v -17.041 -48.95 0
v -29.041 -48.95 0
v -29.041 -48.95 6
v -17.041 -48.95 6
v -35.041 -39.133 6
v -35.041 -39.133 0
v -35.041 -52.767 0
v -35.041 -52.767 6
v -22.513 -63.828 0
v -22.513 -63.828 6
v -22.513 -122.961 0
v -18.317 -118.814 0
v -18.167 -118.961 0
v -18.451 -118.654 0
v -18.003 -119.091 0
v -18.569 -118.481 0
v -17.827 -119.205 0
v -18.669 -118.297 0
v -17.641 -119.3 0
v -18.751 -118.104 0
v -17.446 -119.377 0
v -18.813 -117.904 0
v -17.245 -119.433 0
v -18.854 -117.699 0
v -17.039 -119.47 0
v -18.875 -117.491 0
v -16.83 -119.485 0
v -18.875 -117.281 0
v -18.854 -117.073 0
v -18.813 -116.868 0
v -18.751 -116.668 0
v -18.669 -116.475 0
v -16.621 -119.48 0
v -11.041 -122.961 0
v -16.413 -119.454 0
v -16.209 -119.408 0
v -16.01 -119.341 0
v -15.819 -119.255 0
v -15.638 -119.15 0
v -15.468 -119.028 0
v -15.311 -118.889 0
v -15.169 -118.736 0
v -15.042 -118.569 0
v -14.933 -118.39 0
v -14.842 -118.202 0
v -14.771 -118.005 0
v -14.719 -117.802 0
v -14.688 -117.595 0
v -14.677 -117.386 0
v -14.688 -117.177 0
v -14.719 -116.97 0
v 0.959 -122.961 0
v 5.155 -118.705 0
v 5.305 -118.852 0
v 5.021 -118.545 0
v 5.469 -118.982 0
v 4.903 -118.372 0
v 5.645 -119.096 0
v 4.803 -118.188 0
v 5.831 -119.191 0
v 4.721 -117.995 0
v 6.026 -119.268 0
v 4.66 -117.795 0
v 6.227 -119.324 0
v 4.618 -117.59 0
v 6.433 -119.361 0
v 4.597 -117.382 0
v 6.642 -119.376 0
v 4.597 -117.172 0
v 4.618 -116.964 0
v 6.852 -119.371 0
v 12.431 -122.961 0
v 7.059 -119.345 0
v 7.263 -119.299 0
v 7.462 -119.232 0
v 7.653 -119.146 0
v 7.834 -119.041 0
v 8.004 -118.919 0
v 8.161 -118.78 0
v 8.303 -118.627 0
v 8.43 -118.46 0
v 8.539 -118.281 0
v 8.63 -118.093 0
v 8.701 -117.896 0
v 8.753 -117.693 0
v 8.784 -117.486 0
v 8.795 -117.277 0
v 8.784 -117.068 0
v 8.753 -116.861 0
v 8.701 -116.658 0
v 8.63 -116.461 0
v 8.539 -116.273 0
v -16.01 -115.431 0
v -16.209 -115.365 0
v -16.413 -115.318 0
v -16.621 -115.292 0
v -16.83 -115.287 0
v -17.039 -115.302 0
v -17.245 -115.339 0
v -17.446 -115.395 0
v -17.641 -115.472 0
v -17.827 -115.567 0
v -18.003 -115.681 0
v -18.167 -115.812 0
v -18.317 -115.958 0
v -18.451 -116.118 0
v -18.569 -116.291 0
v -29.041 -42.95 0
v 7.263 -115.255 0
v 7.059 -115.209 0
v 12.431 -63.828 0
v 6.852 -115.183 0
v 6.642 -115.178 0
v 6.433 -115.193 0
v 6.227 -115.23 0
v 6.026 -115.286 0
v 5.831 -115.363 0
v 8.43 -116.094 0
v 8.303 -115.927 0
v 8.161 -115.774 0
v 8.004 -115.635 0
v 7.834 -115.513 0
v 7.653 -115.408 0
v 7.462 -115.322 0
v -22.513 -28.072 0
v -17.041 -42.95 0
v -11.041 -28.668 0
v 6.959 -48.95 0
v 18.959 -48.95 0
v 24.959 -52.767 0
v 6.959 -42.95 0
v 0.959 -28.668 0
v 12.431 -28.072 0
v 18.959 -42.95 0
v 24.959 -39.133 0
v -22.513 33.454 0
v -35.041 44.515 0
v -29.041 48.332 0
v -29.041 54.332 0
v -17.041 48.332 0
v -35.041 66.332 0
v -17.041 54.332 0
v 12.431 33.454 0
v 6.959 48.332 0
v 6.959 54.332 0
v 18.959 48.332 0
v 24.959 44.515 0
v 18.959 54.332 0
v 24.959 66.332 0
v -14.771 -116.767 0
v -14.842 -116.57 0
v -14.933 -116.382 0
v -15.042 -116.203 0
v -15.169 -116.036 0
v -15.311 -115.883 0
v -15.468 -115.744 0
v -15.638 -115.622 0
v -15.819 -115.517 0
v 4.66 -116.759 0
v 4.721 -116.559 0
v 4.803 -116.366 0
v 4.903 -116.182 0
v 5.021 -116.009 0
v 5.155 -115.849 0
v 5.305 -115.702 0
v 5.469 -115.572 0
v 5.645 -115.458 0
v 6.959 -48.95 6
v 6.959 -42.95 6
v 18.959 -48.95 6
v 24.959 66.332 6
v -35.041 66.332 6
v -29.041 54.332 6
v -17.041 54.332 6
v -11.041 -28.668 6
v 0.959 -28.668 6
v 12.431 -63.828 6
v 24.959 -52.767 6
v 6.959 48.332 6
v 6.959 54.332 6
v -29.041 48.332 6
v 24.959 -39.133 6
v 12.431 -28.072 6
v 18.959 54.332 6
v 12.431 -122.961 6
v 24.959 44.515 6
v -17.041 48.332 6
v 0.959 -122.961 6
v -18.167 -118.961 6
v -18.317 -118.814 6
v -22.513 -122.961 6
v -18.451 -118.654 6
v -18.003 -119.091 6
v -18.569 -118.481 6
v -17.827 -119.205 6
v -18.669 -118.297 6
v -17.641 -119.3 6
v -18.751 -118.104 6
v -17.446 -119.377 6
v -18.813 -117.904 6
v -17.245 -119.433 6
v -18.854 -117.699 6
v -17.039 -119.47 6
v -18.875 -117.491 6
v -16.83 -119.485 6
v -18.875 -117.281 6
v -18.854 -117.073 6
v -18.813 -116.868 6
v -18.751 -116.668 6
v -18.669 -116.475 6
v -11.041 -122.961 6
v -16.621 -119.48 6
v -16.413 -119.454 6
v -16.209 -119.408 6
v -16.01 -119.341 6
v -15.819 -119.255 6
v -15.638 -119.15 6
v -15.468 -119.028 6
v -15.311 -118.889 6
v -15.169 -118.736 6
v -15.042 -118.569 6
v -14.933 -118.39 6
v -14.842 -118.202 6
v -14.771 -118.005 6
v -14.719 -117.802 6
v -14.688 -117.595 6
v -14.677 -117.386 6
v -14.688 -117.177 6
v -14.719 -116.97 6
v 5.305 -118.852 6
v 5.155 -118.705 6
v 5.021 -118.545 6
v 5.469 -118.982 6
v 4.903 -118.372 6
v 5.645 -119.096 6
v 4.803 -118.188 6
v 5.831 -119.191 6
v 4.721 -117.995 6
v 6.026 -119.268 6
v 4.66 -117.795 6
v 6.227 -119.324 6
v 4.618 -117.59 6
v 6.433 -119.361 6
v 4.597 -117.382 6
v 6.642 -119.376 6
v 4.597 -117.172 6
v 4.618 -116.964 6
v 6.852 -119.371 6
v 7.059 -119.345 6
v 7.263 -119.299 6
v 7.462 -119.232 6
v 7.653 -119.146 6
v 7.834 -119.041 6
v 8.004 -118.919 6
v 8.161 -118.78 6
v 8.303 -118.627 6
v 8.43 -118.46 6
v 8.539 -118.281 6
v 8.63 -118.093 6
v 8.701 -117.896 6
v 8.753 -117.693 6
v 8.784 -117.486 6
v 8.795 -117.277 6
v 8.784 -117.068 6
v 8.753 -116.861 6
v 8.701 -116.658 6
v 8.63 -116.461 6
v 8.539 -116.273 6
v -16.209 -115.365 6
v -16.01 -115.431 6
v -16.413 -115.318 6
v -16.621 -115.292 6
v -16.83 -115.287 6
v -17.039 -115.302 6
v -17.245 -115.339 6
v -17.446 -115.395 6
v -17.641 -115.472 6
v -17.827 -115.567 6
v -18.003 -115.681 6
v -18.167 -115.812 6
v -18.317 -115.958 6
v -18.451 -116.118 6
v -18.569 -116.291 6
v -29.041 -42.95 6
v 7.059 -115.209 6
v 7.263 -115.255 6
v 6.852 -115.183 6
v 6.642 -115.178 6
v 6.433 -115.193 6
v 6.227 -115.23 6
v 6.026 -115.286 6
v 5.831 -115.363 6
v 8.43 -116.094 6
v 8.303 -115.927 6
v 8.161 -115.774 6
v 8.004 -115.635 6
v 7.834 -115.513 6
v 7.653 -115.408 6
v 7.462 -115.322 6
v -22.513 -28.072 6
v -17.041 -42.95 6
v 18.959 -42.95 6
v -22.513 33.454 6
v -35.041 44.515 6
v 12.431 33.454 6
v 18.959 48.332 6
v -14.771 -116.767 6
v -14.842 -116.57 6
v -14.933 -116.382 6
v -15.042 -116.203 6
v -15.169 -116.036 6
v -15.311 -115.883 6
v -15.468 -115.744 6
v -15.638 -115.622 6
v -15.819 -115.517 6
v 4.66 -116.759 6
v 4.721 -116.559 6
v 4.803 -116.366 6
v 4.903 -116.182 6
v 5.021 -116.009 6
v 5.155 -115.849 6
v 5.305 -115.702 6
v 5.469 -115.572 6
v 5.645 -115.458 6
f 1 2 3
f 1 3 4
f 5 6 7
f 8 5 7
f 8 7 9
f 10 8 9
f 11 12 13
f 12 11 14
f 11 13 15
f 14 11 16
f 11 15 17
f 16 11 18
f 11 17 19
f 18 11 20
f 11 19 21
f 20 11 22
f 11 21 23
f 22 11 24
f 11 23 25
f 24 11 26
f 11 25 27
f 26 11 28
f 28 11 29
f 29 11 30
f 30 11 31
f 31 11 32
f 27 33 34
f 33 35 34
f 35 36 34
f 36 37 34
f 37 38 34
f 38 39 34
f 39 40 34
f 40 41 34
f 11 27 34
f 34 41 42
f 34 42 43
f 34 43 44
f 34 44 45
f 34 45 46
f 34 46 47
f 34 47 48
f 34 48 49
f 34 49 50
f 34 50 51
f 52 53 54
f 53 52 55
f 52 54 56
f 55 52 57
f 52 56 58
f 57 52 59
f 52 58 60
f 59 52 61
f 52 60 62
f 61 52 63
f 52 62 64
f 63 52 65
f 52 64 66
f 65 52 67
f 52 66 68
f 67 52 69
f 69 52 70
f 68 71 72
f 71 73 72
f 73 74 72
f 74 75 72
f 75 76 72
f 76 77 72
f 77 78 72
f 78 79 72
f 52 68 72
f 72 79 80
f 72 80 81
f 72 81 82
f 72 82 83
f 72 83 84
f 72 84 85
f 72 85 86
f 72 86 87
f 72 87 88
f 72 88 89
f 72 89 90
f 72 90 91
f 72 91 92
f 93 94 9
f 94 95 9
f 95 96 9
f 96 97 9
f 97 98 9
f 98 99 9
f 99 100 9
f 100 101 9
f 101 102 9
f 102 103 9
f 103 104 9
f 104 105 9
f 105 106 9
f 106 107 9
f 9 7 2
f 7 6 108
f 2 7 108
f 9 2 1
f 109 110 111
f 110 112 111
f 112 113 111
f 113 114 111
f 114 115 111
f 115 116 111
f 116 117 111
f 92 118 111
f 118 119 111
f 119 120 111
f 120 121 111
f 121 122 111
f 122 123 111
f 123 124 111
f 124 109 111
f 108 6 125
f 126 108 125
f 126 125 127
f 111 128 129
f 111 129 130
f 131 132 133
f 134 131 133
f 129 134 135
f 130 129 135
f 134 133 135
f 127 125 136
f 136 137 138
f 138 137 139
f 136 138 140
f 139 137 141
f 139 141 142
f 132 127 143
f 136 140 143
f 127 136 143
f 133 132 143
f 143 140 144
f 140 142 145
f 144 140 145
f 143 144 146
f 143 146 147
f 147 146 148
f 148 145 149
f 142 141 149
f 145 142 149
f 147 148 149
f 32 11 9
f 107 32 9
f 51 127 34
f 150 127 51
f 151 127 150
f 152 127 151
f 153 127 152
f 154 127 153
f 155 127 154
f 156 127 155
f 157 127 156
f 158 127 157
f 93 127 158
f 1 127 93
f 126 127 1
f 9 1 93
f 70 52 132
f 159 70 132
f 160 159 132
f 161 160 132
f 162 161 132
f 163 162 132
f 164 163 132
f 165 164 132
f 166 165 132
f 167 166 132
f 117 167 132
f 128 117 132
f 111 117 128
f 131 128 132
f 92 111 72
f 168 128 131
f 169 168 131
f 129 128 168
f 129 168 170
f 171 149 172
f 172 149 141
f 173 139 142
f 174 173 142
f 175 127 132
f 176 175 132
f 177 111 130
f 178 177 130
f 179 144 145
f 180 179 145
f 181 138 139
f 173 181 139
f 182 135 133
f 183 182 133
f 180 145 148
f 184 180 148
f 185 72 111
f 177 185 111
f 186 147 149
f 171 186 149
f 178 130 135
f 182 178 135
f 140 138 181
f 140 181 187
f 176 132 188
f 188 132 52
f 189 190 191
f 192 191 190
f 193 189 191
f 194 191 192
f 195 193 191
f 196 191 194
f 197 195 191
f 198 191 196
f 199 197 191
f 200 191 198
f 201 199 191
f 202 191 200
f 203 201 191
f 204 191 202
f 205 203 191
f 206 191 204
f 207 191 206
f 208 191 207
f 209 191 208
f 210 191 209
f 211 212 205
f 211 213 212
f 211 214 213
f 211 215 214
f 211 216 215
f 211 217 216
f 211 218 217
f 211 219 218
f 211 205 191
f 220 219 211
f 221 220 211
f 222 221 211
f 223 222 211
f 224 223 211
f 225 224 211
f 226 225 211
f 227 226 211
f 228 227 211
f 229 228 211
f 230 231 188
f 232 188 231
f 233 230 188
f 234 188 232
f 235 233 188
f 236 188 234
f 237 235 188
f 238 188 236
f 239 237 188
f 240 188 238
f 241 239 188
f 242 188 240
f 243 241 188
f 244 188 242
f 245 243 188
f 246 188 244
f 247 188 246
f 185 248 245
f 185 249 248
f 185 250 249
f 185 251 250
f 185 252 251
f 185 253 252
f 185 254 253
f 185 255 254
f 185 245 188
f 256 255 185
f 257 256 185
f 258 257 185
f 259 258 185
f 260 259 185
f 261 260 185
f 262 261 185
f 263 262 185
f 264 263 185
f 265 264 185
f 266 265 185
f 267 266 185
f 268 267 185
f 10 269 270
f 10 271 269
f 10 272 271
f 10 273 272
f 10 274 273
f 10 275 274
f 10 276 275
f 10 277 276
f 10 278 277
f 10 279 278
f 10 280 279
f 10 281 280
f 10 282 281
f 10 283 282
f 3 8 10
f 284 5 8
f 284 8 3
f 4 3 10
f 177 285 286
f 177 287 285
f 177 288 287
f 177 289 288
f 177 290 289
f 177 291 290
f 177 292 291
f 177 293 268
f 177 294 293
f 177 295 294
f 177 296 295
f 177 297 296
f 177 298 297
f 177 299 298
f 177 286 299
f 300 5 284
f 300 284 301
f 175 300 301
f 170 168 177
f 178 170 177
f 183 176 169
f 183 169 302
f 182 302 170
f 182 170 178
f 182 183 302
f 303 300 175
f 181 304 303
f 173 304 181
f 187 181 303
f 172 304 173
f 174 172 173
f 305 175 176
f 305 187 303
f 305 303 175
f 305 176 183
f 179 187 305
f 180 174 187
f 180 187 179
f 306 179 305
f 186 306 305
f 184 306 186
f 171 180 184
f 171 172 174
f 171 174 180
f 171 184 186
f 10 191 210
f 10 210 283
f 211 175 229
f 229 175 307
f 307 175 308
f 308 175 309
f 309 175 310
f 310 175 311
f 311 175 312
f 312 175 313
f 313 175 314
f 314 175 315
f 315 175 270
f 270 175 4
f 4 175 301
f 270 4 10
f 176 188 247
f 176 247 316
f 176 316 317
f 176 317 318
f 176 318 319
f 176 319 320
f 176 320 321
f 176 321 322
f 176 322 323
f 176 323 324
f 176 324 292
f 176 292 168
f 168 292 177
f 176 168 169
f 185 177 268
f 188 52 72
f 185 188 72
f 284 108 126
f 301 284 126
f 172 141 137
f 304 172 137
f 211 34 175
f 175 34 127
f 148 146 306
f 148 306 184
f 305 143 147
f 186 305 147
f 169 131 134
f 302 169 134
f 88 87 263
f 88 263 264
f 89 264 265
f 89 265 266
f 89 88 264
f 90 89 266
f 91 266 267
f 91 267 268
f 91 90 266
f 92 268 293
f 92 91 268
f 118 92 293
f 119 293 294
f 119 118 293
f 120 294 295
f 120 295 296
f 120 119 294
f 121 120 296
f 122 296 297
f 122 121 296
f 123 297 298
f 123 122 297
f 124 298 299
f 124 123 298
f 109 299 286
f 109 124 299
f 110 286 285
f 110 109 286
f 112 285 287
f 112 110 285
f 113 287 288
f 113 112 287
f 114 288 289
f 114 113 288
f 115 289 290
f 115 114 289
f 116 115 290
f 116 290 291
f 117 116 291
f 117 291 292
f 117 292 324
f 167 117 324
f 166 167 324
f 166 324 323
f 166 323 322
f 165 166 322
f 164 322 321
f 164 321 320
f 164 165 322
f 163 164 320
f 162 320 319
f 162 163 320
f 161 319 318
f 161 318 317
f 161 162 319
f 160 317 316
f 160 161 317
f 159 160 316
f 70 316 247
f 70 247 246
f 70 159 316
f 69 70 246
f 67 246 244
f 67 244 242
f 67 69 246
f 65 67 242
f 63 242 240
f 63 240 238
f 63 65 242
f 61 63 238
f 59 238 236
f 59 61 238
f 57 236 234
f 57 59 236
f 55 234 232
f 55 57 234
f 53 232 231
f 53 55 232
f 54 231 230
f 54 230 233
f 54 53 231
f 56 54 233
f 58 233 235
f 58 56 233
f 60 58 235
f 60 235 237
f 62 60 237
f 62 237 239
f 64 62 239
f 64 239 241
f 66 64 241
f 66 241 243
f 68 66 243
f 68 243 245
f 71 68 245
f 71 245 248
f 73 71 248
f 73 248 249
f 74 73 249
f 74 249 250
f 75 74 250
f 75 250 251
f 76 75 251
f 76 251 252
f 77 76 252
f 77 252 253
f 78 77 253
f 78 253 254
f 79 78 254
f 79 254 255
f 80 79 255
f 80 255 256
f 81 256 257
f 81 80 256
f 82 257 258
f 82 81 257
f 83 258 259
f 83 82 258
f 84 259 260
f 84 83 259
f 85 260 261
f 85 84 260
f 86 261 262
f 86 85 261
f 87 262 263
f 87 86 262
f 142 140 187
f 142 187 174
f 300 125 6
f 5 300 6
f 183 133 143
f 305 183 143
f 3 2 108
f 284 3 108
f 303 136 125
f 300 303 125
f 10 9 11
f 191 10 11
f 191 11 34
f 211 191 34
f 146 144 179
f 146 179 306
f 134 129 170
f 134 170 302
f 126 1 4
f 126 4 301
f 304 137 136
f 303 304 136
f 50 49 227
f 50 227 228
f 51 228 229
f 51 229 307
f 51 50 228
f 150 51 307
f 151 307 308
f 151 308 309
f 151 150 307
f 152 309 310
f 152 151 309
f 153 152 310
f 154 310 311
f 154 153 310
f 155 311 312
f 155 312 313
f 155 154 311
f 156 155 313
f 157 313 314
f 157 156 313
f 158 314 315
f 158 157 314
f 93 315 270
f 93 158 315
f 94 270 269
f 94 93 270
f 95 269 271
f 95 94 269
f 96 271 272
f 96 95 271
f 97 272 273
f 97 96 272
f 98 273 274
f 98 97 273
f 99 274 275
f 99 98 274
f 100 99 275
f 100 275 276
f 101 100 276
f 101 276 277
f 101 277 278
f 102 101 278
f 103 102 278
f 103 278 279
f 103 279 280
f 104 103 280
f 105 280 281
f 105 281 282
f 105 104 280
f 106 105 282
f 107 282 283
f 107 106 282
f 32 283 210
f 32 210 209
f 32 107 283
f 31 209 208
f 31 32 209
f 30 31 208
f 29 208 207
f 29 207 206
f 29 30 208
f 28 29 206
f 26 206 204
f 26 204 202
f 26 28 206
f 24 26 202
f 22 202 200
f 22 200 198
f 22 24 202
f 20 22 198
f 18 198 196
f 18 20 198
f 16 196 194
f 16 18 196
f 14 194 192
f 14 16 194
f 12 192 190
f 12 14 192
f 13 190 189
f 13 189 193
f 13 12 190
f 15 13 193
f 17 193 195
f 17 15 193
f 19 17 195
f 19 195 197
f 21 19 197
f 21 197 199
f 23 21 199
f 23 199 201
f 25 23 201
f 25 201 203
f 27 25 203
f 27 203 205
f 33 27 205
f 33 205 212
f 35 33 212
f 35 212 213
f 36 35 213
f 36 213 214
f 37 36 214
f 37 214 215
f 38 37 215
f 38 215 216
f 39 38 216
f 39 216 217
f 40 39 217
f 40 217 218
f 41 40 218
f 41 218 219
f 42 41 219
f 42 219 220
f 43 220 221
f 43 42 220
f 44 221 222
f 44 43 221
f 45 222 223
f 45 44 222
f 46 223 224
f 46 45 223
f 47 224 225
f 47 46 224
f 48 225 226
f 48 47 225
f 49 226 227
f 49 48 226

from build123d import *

# Parameters (mm, degrees)
SKETCH1_R           = 2.1
SKETCH1_W           = 12
SKETCH1_H           = 6
BOSS_EXTRUDE1_DEPTH = 6


with BuildPart() as part:
    # Sketch1 → Boss-Extrude1 (new body)
    with BuildSketch(Plane.XY):
        Polygon((24.958587154, 66.332129581), (-35.041412846, 66.332129581), (-35.041412846, 44.514954247), (-22.5134665, 33.454149031), (-22.5134665, -28.072174919), (-35.041412846, -39.132980135), (-35.041412846, -52.767330805), (-22.5134665, -63.828136021), (-22.5134665, -122.961056524), (-11.041412846, -122.961056524), (-11.041412846, -73.667870419), (-11.041412846, -28.667870419), (0.958587154, -28.667870419), (0.958587154, -73.667870419), (0.958587154, -122.961056524), (12.430640807, -122.961056524), (12.430640807, -63.828136021), (24.958587154, -52.767330805), (24.958587154, -39.132980135), (12.430640807, -28.072174919), (12.430640807, 33.454149031), (24.958587154, 44.514954247), align=None)
        with Locations((-16.777439673, -117.386123735)):
            Circle(SKETCH1_R, mode=Mode.SUBTRACT)
        with Locations((-23.041412846, -45.95015547)):
            Rectangle(SKETCH1_W, SKETCH1_H, mode=Mode.SUBTRACT)
        with Locations((6.69461398, -117.276997452)):
            Circle(SKETCH1_R, mode=Mode.SUBTRACT)
        with Locations((12.958587154, -45.95015547)):
            Rectangle(SKETCH1_W, SKETCH1_H, mode=Mode.SUBTRACT)
        with Locations((-23.041412846, 51.332129581)):
            Rectangle(SKETCH1_W, SKETCH1_H, mode=Mode.SUBTRACT)
        with Locations((12.958587154, 51.332129581)):
            Rectangle(SKETCH1_W, SKETCH1_H, mode=Mode.SUBTRACT)
    extrude(amount=BOSS_EXTRUDE1_DEPTH)


solid = part.part
